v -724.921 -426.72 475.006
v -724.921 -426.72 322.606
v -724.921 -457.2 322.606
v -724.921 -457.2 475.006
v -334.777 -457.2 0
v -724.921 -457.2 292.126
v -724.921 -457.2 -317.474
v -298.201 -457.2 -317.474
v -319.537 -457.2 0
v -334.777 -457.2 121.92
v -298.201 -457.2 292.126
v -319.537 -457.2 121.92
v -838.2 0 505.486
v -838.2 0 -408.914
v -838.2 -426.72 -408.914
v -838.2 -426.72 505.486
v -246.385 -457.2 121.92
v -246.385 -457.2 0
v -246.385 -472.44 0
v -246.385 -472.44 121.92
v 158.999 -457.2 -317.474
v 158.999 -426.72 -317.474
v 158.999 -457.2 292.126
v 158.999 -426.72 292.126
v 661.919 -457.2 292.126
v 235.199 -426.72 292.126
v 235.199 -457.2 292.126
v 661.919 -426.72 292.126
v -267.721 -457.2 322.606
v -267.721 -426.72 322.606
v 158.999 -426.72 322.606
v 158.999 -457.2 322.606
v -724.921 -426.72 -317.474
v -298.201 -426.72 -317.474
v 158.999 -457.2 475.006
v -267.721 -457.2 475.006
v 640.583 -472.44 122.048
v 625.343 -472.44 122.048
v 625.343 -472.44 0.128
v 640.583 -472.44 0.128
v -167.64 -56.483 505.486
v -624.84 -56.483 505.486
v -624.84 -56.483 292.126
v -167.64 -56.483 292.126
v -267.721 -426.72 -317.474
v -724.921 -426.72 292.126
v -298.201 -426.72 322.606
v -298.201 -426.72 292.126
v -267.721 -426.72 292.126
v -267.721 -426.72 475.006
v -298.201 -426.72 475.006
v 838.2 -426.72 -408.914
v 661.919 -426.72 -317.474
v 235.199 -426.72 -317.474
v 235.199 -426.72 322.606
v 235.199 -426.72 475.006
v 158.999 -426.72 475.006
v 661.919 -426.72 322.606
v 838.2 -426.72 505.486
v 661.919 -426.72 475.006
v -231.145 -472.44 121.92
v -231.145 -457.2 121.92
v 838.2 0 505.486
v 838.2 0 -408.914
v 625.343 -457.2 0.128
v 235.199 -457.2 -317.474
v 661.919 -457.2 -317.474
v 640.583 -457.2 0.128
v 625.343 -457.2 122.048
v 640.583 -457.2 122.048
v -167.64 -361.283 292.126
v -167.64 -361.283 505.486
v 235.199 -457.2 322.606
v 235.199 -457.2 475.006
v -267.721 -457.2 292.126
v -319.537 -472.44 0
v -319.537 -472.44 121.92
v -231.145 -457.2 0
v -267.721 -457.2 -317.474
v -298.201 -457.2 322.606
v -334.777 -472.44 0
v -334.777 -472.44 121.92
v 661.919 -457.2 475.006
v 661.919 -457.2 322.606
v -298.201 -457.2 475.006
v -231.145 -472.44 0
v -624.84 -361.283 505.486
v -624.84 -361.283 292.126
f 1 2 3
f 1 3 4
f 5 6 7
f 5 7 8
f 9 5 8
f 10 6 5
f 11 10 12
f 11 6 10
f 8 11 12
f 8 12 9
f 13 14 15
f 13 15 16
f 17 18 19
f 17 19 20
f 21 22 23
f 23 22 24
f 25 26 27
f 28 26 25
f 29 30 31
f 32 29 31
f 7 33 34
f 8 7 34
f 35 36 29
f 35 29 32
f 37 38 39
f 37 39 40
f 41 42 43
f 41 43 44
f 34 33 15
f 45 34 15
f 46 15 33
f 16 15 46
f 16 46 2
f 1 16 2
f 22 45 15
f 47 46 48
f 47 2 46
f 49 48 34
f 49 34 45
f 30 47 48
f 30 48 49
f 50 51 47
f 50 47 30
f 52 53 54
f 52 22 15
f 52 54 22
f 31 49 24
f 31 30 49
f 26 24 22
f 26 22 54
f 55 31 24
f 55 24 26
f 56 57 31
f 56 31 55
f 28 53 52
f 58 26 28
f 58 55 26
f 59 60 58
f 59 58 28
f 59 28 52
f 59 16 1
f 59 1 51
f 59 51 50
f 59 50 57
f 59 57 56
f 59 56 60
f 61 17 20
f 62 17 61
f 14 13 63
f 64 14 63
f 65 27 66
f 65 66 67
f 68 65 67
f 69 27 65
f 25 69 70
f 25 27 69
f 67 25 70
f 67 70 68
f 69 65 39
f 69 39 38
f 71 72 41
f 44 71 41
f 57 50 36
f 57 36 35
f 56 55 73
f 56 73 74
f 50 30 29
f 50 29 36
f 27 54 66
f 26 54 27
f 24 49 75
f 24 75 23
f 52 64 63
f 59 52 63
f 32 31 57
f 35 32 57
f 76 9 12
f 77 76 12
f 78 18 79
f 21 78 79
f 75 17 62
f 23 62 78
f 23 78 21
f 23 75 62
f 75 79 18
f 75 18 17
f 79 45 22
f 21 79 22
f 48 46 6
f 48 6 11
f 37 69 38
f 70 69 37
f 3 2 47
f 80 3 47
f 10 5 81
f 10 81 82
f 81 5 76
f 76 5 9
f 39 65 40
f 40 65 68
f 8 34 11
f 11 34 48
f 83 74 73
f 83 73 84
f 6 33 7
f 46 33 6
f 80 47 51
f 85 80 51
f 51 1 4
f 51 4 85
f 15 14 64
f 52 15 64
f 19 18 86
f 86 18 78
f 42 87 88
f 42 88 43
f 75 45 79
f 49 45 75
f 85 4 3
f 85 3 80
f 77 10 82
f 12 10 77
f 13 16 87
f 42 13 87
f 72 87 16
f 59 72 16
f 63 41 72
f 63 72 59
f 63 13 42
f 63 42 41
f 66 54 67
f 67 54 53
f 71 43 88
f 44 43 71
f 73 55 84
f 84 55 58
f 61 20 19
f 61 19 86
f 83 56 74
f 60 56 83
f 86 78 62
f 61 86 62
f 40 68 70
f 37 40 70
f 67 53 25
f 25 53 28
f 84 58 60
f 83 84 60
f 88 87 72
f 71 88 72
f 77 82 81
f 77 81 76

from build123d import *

# Parameters (mm, degrees)
F0_W     = 1676.4
F0_H     = 914.4
F1_DEPTH = 426.72
F2_W     = 426.72
F2_H     = 609.6
F2_H_2   = 152.4
F3_DEPTH = 30.48
F4_W     = 15.24
F4_H     = 121.92
F5_DEPTH = 45.72
F6_W     = 457.2
F6_H     = 304.8
F7_DEPTH = 213.36


with BuildPart() as f1:
    # F0 (on Front) → F1 (new body)
    with BuildSketch(Plane.XZ):
        with Locations((2e-06, 48.286399)):
            Rectangle(F0_W, F0_H)
    extrude(amount=F1_DEPTH)

    # F2 (on face) → F3 (join)
    with BuildSketch(Plane.XZ.offset(426.72)):
        with Locations((-511.561048, -12.673601)):
            Rectangle(F2_W, F2_H)
        with Locations((-54.361048, -12.673601)):
            Rectangle(F2_W, F2_H)
        with Locations((448.558952, -12.673601)):
            Rectangle(F2_W, F2_H)
        with Locations((-511.561048, 398.806399)):
            Rectangle(F2_W, F2_H_2)
        with Locations((-54.361048, 398.806399)):
            Rectangle(F2_W, F2_H_2)
        with Locations((448.558952, 398.806399)):
            Rectangle(F2_W, F2_H_2)
    extrude(amount=F3_DEPTH)

    # F4 (on face) → F5 (join)
    with BuildSketch(Plane.XZ.offset(426.72)):
        with Locations((-327.157048, 60.96)):
            Rectangle(F4_W, F4_H)
        with Locations((-238.765048, 60.96)):
            Rectangle(F4_W, F4_H)
        with Locations((632.962952, 61.087999)):
            Rectangle(F4_W, F4_H)
    extrude(amount=F5_DEPTH)

    # F6 (on face) → F7 (cut)
    with BuildSketch(Plane.XY.offset(505.486399)):
        with Locations((-396.239998, -208.883211)):
            Rectangle(F6_W, F6_H)
    extrude(amount=-F7_DEPTH, mode=Mode.SUBTRACT)


solid = f1.part
